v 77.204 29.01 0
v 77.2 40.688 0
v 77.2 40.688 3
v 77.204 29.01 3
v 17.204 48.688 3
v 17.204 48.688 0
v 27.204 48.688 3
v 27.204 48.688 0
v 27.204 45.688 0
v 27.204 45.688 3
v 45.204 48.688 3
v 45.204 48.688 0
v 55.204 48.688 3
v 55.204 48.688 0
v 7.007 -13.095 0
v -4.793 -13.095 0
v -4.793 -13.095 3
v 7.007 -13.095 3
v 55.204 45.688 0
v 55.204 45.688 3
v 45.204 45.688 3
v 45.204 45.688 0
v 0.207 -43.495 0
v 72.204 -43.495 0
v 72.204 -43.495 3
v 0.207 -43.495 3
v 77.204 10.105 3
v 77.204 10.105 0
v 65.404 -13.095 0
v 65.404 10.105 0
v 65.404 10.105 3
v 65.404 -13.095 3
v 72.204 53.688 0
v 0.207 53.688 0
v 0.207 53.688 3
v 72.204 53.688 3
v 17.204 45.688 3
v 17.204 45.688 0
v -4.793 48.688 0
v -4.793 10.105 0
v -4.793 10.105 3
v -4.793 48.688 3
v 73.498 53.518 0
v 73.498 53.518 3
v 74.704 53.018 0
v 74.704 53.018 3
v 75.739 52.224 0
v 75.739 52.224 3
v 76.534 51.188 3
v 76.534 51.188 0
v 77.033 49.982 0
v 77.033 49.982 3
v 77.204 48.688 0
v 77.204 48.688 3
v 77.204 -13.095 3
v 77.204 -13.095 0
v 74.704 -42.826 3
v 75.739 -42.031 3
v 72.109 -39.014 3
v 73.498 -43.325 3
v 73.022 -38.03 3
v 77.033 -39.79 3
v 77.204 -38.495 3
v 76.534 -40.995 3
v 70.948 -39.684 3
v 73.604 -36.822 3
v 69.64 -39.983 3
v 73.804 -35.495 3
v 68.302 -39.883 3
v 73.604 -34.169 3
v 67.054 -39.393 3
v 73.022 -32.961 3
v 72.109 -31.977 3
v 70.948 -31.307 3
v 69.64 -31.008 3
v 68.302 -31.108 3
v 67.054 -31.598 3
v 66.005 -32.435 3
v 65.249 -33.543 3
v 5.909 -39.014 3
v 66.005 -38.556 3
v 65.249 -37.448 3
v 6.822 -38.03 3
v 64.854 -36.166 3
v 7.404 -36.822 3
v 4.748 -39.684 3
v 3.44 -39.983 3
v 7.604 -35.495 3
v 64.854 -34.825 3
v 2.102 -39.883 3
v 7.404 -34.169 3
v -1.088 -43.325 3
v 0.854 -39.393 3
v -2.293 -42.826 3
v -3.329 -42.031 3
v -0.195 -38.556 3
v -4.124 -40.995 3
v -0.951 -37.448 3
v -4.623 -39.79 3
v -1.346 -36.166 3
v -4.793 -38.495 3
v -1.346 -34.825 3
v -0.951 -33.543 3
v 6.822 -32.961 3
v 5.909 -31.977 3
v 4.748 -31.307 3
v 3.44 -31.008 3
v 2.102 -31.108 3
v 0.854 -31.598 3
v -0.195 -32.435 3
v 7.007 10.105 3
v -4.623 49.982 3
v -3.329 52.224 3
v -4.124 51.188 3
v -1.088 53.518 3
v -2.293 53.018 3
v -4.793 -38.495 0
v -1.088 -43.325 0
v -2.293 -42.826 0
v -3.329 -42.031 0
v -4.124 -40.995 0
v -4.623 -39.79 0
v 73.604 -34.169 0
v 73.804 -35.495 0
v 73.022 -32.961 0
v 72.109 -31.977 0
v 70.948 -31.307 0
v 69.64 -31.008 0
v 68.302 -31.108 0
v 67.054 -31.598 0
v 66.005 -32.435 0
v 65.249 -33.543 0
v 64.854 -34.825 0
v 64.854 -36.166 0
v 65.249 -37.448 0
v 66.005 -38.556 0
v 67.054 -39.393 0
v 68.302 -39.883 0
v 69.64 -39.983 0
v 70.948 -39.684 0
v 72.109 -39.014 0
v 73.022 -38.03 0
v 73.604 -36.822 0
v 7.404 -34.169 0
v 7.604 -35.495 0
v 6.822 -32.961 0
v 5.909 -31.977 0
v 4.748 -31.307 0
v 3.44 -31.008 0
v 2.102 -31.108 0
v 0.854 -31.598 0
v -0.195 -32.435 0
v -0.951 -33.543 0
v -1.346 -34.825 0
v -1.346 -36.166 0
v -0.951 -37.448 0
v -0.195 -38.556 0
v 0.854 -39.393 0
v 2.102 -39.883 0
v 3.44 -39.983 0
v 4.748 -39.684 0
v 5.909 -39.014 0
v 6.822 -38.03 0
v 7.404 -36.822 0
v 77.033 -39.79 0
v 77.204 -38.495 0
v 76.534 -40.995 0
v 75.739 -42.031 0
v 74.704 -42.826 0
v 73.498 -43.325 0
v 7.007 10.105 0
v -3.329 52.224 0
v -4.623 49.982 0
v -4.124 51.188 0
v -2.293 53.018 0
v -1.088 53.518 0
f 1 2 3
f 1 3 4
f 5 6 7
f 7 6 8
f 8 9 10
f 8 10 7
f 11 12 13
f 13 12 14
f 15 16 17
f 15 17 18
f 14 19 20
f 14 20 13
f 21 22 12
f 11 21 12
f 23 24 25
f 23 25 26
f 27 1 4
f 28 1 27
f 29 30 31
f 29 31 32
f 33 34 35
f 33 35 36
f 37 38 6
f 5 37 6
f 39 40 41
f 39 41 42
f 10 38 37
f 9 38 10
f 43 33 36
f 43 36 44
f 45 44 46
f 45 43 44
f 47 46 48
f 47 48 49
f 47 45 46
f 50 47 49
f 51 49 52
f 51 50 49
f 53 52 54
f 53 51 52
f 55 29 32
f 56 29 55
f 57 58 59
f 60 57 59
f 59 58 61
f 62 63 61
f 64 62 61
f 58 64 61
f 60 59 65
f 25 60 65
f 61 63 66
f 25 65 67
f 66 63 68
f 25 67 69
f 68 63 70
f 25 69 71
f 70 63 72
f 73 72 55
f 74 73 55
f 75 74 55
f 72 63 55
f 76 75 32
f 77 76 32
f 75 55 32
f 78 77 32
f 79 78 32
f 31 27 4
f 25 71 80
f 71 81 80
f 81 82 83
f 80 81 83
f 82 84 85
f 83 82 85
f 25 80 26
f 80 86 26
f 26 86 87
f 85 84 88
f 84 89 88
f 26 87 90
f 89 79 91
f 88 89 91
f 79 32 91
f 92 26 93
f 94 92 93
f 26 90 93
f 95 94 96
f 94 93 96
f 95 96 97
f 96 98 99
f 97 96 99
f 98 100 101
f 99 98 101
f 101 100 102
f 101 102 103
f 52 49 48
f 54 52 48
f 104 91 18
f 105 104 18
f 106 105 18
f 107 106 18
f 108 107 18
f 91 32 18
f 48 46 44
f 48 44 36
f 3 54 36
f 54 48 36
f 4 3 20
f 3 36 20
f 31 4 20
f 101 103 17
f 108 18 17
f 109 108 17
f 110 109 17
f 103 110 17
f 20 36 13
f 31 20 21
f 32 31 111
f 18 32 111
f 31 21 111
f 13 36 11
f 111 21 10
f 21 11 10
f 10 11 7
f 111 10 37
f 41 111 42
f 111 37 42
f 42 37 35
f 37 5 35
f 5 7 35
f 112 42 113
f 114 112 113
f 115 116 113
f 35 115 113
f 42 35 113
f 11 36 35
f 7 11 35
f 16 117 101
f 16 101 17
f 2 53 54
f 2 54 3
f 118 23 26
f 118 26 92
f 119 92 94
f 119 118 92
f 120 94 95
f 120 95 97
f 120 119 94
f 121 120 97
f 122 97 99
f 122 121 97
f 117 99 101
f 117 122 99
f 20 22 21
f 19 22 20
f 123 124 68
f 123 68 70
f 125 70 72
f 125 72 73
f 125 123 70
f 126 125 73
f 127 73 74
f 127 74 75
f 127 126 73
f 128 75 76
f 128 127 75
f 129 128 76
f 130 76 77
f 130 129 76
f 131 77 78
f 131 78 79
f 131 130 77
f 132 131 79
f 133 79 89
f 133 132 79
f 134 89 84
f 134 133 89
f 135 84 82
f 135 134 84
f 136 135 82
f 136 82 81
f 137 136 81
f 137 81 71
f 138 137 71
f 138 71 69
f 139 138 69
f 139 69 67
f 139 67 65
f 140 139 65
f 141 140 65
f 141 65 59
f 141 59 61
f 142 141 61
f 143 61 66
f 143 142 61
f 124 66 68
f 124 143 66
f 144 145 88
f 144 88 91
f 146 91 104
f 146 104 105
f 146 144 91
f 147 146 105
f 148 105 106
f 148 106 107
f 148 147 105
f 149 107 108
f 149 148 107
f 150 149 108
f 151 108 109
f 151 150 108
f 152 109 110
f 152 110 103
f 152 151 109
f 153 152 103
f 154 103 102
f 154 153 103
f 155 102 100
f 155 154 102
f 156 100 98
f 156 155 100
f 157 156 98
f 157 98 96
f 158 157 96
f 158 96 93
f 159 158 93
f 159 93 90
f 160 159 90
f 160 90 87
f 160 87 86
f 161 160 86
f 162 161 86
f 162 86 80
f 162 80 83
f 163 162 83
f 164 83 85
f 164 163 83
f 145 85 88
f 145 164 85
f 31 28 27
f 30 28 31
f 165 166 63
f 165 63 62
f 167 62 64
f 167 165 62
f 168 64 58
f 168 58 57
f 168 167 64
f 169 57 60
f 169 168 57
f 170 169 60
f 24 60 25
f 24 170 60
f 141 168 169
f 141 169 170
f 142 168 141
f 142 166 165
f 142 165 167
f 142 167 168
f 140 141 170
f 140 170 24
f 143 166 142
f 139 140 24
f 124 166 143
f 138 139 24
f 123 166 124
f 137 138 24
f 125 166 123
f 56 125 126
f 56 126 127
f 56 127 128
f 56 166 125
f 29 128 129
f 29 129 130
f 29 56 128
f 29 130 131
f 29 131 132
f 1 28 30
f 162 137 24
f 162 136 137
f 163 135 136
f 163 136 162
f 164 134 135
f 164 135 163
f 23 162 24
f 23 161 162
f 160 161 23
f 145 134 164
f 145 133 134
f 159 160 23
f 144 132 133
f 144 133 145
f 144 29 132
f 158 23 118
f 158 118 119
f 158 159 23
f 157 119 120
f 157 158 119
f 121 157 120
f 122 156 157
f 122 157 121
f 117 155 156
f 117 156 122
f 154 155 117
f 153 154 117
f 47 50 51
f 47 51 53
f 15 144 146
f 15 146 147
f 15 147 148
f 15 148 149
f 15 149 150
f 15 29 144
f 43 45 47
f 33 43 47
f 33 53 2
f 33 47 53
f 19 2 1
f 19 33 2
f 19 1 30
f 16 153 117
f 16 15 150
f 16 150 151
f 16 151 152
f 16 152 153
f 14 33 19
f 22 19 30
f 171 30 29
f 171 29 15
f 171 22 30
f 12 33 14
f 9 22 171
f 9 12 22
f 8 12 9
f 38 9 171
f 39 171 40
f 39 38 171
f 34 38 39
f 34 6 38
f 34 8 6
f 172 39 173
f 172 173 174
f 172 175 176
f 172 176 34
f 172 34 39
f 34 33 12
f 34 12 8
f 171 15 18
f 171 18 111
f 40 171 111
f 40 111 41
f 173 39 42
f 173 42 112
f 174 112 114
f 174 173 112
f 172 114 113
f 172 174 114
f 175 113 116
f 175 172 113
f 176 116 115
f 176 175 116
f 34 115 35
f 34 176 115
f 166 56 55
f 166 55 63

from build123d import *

# Parameters (mm, degrees)
MODEL_R                 = 4.5
MODEL_W                 = 10
MODEL_H                 = 3
SALIENTE_EXTRUIR1_DEPTH = 3


with BuildPart() as part:
    # Model → Saliente-Extruir1 (new body)
    with BuildSketch(Plane.XY):
        with BuildLine():
            Line((17.831945339, 53.688342713), (41.944056128, 53.688342713))
            Line((41.944056128, 53.688342713), (62.686495879, 53.688342713))
            Line((62.686495879, 53.688342713), (72.203528383, 53.688342713))
            ThreePointArc((72.203528383, 53.688342713), (75.739062289, 52.223876619), (77.203528383, 48.688342713))
            Line((77.203528383, 48.688342713), (77.200462039, 40.688342713))
            Line((77.200462039, 40.688342713), (77.203528383, 29.009907229))
            Line((77.203528383, 29.009907229), (77.203528383, 19.550667198))
            Line((77.203528383, 19.550667198), (77.203528383, 10.10455356))
            Line((77.203528383, 10.10455356), (65.403528383, 10.10455356))
            Line((65.403528383, 10.10455356), (65.403528383, -13.09544644))
            Line((65.403528383, -13.09544644), (77.203528383, -13.09544644))
            Line((77.203528383, -13.09544644), (77.203528383, -33.19043659))
            Line((77.203528383, -33.19043659), (77.203528383, -38.49544644))
            ThreePointArc((77.203528383, -38.49544644), (75.739062152, -42.030980095), (72.203528383, -43.495446053))
            Line((72.203528383, -43.495446053), (0.206594728, -43.495446053))
            ThreePointArc((0.206594728, -43.495446053), (-3.328939178, -42.030979958), (-4.793405272, -38.495446053))
            Line((-4.793405272, -38.495446053), (-4.793405272, -13.09544644))
            Line((-4.793405272, -13.09544644), (7.006594728, -13.09544644))
            Line((7.006594728, -13.09544644), (7.006594728, 10.10455356))
            Line((7.006594728, 10.10455356), (-4.793405272, 10.10455356))
            Line((-4.793405272, 10.10455356), (-4.793405272, 40.688342713))
            Line((-4.793405272, 40.688342713), (-4.793405272, 48.688342713))
            ThreePointArc((-4.793405272, 48.688342713), (-3.328939178, 52.223876619), (0.206594728, 53.688342713))
            Line((0.206594728, 53.688342713), (6.681518597, 53.688342713))
            Line((6.681518597, 53.688342713), (17.831945339, 53.688342713))
        make_face()
        with Locations((69.303528383, -35.49544644)):
            Circle(MODEL_R, mode=Mode.SUBTRACT)
        with Locations((3.103528383, -35.49544644)):
            Circle(MODEL_R, mode=Mode.SUBTRACT)
        with Locations((22.203528383, 47.188342713)):
            Rectangle(MODEL_W, MODEL_H, mode=Mode.SUBTRACT)
        with Locations((50.203528383, 47.188342713)):
            Rectangle(MODEL_W, MODEL_H, mode=Mode.SUBTRACT)
    extrude(amount=SALIENTE_EXTRUIR1_DEPTH)


solid = part.part
